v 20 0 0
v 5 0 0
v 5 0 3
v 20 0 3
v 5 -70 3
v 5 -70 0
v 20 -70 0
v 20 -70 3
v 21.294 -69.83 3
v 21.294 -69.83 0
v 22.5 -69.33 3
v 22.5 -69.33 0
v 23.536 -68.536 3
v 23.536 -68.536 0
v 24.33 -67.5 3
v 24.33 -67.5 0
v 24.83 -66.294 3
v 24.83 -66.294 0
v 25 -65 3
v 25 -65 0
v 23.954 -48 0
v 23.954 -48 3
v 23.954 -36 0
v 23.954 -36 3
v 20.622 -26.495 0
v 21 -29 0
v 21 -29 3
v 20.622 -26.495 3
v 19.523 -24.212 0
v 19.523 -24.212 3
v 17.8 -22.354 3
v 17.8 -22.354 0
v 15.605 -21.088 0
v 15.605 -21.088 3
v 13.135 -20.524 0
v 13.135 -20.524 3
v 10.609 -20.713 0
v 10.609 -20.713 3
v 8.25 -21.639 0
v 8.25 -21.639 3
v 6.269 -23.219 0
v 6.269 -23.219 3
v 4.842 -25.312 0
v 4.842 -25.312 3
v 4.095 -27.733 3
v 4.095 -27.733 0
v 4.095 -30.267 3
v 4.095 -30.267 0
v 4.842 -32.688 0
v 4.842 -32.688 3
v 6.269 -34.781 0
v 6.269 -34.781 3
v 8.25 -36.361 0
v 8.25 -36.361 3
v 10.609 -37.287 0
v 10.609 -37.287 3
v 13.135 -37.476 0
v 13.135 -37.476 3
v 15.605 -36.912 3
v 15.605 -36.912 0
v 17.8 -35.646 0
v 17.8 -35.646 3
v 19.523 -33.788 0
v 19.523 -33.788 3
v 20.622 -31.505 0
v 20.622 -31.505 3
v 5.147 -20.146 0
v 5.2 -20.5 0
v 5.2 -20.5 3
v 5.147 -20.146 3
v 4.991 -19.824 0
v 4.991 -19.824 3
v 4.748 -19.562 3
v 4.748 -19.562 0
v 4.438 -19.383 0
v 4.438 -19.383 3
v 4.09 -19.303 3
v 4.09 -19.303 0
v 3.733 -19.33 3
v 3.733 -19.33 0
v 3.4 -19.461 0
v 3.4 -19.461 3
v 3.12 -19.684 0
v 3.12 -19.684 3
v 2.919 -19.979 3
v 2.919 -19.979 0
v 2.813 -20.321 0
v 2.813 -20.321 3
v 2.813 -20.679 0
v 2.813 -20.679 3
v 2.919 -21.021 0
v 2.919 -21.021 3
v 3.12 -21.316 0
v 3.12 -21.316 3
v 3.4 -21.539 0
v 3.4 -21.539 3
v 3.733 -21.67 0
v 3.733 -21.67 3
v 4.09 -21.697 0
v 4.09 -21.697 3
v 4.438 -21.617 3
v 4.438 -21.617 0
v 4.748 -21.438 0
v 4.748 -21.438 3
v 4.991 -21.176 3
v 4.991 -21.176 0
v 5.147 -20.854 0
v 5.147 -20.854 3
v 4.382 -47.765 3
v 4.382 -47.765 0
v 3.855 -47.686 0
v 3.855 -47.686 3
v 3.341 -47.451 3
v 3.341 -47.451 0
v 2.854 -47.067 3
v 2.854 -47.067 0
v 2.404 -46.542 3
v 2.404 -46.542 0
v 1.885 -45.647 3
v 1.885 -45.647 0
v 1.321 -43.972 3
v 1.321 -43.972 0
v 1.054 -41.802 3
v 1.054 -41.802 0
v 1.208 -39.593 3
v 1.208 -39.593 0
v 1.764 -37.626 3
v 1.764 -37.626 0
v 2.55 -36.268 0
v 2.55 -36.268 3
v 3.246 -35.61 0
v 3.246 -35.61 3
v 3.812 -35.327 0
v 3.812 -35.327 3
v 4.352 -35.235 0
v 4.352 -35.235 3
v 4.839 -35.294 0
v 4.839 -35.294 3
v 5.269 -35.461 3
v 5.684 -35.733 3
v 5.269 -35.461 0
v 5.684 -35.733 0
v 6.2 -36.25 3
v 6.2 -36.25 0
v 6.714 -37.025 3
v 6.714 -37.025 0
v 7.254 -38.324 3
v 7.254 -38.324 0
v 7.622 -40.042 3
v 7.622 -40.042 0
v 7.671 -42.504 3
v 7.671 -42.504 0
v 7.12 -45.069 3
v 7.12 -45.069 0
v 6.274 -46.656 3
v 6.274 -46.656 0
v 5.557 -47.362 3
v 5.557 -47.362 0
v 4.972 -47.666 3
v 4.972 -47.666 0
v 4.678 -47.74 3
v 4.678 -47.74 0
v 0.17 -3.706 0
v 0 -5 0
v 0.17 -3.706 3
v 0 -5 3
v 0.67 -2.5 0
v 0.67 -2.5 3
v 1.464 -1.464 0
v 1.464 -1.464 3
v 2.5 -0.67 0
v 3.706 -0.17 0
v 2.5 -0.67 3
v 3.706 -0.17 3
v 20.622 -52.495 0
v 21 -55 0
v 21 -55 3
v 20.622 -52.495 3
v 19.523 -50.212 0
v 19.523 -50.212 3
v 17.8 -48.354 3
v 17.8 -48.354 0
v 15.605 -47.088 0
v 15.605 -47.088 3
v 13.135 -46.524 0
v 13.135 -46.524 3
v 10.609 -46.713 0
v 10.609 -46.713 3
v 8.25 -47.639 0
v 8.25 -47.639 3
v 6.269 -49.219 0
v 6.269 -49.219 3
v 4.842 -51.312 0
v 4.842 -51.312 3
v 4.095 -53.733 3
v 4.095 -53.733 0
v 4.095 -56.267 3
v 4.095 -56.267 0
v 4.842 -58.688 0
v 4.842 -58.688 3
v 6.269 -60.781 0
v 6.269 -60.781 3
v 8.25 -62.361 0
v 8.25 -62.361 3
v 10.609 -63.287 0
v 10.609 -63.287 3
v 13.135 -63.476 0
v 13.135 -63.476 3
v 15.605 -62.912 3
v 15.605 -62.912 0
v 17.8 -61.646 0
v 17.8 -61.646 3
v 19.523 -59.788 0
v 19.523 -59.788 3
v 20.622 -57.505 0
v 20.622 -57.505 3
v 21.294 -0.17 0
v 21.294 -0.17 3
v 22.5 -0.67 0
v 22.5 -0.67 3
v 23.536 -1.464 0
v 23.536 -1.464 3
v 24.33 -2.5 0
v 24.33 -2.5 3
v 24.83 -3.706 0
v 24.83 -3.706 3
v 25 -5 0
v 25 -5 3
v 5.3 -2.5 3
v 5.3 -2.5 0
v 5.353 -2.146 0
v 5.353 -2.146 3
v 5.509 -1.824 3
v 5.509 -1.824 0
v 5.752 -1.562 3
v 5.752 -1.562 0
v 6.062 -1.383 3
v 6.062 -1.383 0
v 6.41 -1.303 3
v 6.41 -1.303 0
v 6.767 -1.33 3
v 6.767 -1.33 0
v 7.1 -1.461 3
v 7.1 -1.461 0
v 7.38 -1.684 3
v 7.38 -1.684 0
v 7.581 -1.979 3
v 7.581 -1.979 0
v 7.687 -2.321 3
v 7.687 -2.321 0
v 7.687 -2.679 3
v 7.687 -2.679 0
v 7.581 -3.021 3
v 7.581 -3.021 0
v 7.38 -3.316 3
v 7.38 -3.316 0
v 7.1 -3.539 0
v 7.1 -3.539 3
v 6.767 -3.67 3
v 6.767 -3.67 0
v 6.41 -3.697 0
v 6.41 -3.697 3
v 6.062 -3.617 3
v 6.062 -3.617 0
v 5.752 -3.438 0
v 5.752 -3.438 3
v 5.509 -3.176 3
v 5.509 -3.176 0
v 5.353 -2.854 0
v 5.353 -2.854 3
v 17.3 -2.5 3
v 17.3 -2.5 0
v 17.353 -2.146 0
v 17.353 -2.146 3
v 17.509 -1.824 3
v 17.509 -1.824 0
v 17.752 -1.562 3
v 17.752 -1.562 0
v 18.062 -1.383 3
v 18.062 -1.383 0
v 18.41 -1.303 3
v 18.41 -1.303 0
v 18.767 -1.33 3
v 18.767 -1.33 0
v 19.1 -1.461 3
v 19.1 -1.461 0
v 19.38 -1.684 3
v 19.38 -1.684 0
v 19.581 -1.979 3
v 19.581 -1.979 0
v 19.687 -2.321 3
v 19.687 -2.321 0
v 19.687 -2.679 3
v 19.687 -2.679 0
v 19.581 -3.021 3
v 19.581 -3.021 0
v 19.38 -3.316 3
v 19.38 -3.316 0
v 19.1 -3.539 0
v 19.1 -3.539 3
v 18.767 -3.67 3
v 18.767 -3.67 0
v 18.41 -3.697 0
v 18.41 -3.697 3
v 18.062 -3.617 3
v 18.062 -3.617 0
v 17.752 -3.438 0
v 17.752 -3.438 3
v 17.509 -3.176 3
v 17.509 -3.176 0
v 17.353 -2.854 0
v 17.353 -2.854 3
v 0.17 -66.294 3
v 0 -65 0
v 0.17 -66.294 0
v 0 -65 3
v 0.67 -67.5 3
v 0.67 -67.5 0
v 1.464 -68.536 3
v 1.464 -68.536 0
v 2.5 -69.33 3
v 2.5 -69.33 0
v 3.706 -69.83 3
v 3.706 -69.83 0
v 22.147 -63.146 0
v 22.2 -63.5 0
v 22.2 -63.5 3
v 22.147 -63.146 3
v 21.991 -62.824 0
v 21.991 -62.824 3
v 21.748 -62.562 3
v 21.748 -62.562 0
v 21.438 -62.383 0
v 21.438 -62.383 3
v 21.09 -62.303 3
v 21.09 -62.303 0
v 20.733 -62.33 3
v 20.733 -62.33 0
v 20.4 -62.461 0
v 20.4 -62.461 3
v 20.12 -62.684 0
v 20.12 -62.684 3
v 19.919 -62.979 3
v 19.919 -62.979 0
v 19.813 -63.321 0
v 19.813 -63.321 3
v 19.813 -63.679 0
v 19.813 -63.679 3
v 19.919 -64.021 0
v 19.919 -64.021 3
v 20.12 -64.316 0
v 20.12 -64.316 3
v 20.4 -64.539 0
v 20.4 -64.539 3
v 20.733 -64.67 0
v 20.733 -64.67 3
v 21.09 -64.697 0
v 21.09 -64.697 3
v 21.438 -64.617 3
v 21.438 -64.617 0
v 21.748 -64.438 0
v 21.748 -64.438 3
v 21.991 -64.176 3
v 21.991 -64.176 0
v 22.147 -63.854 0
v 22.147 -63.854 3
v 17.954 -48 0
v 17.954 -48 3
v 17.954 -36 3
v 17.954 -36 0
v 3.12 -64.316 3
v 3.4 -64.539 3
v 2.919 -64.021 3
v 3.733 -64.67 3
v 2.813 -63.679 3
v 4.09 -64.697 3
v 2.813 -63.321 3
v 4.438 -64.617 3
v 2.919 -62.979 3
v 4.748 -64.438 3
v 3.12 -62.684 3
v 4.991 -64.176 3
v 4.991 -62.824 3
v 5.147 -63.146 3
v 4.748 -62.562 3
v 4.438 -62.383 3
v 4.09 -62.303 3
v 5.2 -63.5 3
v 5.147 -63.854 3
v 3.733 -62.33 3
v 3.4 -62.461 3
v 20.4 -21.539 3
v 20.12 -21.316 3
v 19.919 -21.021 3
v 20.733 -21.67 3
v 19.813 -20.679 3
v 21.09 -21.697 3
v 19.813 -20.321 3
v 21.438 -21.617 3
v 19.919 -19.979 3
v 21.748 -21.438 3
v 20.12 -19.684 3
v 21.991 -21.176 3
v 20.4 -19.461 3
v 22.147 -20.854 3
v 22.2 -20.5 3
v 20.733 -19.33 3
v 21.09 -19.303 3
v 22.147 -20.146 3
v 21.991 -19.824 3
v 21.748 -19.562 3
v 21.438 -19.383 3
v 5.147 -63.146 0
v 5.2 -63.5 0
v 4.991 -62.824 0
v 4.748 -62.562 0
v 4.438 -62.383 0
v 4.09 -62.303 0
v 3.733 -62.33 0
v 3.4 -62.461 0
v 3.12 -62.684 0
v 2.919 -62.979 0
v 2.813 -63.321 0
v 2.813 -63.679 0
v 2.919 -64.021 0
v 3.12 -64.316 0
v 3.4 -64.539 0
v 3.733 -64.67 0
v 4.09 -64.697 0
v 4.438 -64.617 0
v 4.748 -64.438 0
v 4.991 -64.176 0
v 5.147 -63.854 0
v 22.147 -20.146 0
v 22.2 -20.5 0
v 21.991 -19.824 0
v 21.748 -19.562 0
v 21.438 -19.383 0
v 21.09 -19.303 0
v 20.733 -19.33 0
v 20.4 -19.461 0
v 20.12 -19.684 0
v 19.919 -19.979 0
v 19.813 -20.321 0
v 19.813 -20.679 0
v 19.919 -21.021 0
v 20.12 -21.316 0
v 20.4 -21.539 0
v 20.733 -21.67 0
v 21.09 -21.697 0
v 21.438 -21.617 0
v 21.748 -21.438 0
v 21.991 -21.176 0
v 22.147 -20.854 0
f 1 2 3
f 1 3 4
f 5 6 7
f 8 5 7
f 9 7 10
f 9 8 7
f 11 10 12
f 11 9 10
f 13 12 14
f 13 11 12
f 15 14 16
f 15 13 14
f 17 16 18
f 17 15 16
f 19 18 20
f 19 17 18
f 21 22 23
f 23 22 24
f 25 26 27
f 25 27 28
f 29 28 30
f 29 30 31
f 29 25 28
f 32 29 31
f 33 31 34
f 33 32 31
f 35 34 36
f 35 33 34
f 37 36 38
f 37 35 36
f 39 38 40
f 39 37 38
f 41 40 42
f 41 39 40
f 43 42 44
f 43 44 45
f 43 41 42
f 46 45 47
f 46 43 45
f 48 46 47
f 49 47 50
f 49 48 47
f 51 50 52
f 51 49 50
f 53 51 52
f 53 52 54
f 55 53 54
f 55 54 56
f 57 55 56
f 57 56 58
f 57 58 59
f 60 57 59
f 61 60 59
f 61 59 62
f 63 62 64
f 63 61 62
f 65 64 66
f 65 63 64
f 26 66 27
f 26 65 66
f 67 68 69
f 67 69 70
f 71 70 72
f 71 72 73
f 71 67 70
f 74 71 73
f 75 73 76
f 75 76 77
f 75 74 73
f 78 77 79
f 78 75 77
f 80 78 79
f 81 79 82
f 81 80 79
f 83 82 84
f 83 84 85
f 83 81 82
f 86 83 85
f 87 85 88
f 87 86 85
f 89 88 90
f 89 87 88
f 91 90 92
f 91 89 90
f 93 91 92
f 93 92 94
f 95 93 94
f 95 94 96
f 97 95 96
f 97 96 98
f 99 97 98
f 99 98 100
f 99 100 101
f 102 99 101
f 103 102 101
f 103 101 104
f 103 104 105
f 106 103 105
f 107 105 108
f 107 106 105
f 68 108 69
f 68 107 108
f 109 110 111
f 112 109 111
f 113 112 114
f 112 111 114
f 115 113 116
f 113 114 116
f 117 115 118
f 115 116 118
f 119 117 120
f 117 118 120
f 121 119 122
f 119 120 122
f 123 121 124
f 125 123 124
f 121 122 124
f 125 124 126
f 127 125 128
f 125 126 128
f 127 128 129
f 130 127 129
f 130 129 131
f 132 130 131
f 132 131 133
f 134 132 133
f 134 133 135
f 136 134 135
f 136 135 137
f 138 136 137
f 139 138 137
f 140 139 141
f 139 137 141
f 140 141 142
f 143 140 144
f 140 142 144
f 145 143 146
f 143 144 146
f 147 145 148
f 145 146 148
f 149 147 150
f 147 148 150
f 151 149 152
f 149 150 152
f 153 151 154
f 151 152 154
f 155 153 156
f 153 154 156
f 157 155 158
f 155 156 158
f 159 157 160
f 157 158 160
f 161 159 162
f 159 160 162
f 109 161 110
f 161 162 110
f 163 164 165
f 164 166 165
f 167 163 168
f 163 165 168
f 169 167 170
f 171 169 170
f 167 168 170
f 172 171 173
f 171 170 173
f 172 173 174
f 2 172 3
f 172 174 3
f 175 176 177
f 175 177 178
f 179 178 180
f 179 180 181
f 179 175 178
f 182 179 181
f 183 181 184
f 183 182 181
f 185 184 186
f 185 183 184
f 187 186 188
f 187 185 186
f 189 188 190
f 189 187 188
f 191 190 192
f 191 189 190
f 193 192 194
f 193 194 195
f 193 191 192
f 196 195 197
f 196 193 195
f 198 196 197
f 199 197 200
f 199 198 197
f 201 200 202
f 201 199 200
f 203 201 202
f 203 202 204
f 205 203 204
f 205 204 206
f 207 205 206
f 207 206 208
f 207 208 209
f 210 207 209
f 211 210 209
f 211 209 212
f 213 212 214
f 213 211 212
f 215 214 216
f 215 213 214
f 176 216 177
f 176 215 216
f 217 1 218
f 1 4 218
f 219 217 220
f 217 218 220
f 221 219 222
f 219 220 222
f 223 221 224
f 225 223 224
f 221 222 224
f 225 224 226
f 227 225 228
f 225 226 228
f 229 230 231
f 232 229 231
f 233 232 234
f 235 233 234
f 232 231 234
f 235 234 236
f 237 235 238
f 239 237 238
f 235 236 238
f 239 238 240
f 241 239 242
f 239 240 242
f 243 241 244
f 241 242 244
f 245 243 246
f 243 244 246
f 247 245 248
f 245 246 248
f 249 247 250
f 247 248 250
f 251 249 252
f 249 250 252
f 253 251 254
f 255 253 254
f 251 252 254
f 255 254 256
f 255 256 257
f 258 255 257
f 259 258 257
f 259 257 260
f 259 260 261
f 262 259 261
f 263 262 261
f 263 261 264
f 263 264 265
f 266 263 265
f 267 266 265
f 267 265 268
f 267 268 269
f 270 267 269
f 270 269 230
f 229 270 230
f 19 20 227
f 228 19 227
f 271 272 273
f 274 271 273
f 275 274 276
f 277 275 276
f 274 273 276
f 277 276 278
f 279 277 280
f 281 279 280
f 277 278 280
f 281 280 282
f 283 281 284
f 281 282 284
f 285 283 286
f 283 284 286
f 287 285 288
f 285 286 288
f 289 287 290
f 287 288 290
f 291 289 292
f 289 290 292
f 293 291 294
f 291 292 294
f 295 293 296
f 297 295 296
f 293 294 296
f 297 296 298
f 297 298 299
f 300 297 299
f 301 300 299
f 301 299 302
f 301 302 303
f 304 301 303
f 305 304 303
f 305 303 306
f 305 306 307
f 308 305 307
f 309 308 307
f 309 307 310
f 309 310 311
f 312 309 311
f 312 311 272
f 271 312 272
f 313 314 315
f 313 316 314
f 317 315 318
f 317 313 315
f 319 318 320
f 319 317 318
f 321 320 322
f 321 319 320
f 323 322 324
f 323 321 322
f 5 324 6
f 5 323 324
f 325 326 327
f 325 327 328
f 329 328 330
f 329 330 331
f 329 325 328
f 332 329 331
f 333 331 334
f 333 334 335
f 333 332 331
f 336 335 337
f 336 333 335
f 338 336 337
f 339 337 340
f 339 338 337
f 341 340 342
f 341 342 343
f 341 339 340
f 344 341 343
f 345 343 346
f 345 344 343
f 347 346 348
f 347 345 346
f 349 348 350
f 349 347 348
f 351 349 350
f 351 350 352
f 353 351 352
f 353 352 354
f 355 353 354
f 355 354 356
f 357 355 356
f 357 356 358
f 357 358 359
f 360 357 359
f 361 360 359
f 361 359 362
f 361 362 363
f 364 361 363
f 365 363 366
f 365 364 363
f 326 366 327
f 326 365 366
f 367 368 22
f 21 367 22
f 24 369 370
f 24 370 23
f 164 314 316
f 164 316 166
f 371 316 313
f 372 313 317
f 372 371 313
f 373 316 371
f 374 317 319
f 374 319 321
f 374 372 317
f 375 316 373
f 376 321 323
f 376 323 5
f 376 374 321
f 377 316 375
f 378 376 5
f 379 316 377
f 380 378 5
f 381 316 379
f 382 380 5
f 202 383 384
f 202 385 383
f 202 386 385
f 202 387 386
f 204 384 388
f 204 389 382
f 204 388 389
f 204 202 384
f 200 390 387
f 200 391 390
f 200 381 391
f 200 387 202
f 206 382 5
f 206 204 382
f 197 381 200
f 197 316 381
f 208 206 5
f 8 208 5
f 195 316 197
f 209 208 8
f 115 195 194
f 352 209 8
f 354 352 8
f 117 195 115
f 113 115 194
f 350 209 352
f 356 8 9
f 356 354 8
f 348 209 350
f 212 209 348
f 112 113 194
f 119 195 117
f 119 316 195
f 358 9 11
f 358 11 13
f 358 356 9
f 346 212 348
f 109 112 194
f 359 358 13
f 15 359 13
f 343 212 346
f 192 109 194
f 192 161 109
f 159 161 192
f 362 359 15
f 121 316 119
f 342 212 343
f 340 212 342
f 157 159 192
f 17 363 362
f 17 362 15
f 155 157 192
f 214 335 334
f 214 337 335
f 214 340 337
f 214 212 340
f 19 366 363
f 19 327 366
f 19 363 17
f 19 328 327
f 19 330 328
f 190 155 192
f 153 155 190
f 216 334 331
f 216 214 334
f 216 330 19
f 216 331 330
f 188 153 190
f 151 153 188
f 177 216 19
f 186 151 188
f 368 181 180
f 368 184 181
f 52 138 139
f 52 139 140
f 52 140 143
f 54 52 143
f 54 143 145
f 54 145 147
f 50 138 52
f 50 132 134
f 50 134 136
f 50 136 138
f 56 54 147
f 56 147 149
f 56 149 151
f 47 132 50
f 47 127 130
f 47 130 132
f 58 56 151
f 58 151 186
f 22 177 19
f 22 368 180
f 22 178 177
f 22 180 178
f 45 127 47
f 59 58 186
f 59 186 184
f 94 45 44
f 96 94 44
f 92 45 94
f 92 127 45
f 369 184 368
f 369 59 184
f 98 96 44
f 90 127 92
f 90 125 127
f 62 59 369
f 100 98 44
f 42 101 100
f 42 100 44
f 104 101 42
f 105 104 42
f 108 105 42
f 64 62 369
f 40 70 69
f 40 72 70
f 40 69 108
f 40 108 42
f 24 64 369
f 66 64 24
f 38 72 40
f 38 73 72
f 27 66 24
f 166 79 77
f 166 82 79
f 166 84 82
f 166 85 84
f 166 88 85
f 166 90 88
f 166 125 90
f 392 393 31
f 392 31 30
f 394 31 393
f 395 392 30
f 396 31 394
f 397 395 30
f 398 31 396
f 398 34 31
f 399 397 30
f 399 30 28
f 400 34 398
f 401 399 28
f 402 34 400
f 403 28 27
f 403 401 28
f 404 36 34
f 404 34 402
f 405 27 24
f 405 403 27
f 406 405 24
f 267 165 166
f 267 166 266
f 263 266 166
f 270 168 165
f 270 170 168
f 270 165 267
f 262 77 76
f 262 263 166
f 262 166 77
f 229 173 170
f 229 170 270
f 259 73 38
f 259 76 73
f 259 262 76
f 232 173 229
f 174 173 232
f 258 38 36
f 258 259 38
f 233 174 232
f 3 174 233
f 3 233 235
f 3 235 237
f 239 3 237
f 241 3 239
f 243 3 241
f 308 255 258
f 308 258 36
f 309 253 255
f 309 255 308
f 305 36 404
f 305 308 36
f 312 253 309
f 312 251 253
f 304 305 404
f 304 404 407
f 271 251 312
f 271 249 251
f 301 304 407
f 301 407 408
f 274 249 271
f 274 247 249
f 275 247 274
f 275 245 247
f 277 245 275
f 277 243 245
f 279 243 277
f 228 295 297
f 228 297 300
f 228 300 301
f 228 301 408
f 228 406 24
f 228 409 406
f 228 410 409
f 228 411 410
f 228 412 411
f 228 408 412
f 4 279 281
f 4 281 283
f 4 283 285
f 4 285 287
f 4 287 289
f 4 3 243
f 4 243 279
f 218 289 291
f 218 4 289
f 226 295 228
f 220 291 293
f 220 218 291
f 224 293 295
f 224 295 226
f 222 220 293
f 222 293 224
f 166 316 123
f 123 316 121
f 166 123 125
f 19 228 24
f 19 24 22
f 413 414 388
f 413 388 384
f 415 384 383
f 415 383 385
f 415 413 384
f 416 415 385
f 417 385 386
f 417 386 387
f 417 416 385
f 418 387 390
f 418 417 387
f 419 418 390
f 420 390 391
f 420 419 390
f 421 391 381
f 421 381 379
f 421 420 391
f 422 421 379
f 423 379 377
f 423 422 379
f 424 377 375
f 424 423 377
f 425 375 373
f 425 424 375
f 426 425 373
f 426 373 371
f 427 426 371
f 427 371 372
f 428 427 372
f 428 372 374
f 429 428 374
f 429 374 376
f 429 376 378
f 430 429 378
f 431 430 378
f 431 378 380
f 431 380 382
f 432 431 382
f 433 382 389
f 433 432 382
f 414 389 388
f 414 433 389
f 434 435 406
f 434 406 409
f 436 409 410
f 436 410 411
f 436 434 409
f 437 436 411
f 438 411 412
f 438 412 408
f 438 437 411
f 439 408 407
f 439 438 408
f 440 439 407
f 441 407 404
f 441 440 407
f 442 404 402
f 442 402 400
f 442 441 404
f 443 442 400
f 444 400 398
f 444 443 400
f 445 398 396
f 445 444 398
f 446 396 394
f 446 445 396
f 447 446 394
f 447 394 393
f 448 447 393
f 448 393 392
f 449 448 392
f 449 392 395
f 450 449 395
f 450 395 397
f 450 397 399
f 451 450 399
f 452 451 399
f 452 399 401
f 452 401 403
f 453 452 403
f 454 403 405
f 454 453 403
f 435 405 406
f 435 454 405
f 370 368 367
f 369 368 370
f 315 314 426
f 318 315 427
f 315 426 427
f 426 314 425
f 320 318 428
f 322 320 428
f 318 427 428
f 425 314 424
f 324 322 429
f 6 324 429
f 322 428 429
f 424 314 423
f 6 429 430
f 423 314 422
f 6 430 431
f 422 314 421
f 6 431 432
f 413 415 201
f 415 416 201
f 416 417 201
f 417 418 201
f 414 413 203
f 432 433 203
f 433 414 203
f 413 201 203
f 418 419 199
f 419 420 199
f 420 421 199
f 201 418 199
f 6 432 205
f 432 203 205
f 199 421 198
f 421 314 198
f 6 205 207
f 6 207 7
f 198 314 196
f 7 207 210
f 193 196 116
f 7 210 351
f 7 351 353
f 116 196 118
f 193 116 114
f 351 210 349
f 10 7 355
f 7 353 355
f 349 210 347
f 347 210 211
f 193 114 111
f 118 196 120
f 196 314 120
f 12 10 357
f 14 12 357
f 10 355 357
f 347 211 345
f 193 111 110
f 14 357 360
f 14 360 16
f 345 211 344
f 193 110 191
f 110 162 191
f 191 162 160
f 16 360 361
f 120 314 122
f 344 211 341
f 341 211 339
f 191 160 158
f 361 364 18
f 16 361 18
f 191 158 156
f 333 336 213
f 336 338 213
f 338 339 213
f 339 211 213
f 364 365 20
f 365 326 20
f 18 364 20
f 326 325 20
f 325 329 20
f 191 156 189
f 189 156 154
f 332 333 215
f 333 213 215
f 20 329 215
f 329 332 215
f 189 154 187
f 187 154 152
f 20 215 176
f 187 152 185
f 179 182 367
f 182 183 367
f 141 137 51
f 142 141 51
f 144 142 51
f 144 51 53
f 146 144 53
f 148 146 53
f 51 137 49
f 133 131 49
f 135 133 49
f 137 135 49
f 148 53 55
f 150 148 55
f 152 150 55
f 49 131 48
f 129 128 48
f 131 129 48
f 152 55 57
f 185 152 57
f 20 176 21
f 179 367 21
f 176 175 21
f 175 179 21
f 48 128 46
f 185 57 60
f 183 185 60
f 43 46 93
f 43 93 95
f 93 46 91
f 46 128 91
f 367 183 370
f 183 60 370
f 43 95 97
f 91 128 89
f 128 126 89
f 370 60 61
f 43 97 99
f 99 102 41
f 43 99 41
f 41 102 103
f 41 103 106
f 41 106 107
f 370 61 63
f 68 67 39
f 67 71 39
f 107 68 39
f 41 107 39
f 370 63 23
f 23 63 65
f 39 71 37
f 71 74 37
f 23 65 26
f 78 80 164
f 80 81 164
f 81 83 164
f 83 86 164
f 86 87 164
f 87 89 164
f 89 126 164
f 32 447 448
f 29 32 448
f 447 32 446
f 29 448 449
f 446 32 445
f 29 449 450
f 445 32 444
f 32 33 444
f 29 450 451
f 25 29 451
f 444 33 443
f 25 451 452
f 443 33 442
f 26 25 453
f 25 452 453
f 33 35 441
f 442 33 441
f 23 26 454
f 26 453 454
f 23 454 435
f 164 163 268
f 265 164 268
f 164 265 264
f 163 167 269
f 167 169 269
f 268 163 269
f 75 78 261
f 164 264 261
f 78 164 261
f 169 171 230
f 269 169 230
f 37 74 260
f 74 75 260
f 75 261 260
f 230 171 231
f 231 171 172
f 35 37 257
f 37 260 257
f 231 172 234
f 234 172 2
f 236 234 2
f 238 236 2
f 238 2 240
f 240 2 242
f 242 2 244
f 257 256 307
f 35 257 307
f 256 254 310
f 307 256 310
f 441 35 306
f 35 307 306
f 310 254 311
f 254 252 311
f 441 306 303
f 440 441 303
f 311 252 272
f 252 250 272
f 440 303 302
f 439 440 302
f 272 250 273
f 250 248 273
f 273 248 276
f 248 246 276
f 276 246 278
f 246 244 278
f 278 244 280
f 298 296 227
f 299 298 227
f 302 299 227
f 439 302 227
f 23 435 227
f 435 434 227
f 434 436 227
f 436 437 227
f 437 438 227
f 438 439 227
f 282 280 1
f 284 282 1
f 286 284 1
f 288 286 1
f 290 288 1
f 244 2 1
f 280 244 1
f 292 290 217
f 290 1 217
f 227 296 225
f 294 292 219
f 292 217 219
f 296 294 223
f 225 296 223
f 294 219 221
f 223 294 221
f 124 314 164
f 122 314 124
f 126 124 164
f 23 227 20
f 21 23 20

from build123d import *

# Parameters (mm, degrees)
SKETCH1_W            = 25
SKETCH1_H            = 70
SKETCH1_R            = 8.5
SKETCH1_R_2          = 1.2
BOSS_EXTRUDE1_DEPTH  = 3
FILLET1_R            = 5
M2_CLEARANCE_HOLE1_D = 2.4
SKETCH4_W            = 6
SKETCH4_H            = 12
CUT_EXTRUDE1_DEPTH   = 3
SKETCH8_RX           = 6.264875336
SKETCH8_RY           = 3.331610005
CUT_EXTRUDE2_DEPTH   = 3


with BuildPart() as part:
    # Sketch1 → Boss-Extrude1 (new body)
    with BuildSketch(Plane.XY):
        with Locations((12.5, -35)):
            Rectangle(SKETCH1_W, SKETCH1_H)
        with Locations((12.5, -29)):
            Circle(SKETCH1_R, mode=Mode.SUBTRACT)
        with Locations((12.5, -55)):
            Circle(SKETCH1_R, mode=Mode.SUBTRACT)
        with Locations((21, -63.5)):
            Circle(SKETCH1_R_2, mode=Mode.SUBTRACT)
        with Locations((4, -63.5)):
            Circle(SKETCH1_R_2, mode=Mode.SUBTRACT)
        with Locations((4, -20.5)):
            Circle(SKETCH1_R_2, mode=Mode.SUBTRACT)
        with Locations((21, -20.5)):
            Circle(SKETCH1_R_2, mode=Mode.SUBTRACT)
    extrude(amount=BOSS_EXTRUDE1_DEPTH)

    # Fillet1
    fillet1_edges = [part.edges().sort_by_distance(p)[0] for p in [
        (0, 0, 1.5),
        (25, 0, 1.5),
        (25, -70, 1.5),
        (0, -70, 1.5),
    ]]
    fillet(fillet1_edges, radius=FILLET1_R)

    # M2 Clearance Hole1 (through all)
    with Locations(Plane.XY.offset(3)):
        with Locations((6.5, -2.5), (18.5, -2.5)):
            Hole(M2_CLEARANCE_HOLE1_D / 2)

    # Sketch4 → Cut-Extrude1 (cut)
    with BuildSketch(Plane.XY.offset(3)):
        with Locations((20.953787987, -42)):
            Rectangle(SKETCH4_W, SKETCH4_H)
    extrude(amount=-CUT_EXTRUDE1_DEPTH, mode=Mode.SUBTRACT)

    # Sketch8 → Cut-Extrude2 (cut)
    with BuildSketch(Plane(origin=(0, 0, 0), x_dir=(-1, 0, 0), z_dir=(0, 0, -1))):
        with Locations(Location((-4.382036581, -41.5), (0, 0, -90))):
            Ellipse(SKETCH8_RX, SKETCH8_RY)
    extrude(amount=-CUT_EXTRUDE2_DEPTH, mode=Mode.SUBTRACT)


solid = part.part
